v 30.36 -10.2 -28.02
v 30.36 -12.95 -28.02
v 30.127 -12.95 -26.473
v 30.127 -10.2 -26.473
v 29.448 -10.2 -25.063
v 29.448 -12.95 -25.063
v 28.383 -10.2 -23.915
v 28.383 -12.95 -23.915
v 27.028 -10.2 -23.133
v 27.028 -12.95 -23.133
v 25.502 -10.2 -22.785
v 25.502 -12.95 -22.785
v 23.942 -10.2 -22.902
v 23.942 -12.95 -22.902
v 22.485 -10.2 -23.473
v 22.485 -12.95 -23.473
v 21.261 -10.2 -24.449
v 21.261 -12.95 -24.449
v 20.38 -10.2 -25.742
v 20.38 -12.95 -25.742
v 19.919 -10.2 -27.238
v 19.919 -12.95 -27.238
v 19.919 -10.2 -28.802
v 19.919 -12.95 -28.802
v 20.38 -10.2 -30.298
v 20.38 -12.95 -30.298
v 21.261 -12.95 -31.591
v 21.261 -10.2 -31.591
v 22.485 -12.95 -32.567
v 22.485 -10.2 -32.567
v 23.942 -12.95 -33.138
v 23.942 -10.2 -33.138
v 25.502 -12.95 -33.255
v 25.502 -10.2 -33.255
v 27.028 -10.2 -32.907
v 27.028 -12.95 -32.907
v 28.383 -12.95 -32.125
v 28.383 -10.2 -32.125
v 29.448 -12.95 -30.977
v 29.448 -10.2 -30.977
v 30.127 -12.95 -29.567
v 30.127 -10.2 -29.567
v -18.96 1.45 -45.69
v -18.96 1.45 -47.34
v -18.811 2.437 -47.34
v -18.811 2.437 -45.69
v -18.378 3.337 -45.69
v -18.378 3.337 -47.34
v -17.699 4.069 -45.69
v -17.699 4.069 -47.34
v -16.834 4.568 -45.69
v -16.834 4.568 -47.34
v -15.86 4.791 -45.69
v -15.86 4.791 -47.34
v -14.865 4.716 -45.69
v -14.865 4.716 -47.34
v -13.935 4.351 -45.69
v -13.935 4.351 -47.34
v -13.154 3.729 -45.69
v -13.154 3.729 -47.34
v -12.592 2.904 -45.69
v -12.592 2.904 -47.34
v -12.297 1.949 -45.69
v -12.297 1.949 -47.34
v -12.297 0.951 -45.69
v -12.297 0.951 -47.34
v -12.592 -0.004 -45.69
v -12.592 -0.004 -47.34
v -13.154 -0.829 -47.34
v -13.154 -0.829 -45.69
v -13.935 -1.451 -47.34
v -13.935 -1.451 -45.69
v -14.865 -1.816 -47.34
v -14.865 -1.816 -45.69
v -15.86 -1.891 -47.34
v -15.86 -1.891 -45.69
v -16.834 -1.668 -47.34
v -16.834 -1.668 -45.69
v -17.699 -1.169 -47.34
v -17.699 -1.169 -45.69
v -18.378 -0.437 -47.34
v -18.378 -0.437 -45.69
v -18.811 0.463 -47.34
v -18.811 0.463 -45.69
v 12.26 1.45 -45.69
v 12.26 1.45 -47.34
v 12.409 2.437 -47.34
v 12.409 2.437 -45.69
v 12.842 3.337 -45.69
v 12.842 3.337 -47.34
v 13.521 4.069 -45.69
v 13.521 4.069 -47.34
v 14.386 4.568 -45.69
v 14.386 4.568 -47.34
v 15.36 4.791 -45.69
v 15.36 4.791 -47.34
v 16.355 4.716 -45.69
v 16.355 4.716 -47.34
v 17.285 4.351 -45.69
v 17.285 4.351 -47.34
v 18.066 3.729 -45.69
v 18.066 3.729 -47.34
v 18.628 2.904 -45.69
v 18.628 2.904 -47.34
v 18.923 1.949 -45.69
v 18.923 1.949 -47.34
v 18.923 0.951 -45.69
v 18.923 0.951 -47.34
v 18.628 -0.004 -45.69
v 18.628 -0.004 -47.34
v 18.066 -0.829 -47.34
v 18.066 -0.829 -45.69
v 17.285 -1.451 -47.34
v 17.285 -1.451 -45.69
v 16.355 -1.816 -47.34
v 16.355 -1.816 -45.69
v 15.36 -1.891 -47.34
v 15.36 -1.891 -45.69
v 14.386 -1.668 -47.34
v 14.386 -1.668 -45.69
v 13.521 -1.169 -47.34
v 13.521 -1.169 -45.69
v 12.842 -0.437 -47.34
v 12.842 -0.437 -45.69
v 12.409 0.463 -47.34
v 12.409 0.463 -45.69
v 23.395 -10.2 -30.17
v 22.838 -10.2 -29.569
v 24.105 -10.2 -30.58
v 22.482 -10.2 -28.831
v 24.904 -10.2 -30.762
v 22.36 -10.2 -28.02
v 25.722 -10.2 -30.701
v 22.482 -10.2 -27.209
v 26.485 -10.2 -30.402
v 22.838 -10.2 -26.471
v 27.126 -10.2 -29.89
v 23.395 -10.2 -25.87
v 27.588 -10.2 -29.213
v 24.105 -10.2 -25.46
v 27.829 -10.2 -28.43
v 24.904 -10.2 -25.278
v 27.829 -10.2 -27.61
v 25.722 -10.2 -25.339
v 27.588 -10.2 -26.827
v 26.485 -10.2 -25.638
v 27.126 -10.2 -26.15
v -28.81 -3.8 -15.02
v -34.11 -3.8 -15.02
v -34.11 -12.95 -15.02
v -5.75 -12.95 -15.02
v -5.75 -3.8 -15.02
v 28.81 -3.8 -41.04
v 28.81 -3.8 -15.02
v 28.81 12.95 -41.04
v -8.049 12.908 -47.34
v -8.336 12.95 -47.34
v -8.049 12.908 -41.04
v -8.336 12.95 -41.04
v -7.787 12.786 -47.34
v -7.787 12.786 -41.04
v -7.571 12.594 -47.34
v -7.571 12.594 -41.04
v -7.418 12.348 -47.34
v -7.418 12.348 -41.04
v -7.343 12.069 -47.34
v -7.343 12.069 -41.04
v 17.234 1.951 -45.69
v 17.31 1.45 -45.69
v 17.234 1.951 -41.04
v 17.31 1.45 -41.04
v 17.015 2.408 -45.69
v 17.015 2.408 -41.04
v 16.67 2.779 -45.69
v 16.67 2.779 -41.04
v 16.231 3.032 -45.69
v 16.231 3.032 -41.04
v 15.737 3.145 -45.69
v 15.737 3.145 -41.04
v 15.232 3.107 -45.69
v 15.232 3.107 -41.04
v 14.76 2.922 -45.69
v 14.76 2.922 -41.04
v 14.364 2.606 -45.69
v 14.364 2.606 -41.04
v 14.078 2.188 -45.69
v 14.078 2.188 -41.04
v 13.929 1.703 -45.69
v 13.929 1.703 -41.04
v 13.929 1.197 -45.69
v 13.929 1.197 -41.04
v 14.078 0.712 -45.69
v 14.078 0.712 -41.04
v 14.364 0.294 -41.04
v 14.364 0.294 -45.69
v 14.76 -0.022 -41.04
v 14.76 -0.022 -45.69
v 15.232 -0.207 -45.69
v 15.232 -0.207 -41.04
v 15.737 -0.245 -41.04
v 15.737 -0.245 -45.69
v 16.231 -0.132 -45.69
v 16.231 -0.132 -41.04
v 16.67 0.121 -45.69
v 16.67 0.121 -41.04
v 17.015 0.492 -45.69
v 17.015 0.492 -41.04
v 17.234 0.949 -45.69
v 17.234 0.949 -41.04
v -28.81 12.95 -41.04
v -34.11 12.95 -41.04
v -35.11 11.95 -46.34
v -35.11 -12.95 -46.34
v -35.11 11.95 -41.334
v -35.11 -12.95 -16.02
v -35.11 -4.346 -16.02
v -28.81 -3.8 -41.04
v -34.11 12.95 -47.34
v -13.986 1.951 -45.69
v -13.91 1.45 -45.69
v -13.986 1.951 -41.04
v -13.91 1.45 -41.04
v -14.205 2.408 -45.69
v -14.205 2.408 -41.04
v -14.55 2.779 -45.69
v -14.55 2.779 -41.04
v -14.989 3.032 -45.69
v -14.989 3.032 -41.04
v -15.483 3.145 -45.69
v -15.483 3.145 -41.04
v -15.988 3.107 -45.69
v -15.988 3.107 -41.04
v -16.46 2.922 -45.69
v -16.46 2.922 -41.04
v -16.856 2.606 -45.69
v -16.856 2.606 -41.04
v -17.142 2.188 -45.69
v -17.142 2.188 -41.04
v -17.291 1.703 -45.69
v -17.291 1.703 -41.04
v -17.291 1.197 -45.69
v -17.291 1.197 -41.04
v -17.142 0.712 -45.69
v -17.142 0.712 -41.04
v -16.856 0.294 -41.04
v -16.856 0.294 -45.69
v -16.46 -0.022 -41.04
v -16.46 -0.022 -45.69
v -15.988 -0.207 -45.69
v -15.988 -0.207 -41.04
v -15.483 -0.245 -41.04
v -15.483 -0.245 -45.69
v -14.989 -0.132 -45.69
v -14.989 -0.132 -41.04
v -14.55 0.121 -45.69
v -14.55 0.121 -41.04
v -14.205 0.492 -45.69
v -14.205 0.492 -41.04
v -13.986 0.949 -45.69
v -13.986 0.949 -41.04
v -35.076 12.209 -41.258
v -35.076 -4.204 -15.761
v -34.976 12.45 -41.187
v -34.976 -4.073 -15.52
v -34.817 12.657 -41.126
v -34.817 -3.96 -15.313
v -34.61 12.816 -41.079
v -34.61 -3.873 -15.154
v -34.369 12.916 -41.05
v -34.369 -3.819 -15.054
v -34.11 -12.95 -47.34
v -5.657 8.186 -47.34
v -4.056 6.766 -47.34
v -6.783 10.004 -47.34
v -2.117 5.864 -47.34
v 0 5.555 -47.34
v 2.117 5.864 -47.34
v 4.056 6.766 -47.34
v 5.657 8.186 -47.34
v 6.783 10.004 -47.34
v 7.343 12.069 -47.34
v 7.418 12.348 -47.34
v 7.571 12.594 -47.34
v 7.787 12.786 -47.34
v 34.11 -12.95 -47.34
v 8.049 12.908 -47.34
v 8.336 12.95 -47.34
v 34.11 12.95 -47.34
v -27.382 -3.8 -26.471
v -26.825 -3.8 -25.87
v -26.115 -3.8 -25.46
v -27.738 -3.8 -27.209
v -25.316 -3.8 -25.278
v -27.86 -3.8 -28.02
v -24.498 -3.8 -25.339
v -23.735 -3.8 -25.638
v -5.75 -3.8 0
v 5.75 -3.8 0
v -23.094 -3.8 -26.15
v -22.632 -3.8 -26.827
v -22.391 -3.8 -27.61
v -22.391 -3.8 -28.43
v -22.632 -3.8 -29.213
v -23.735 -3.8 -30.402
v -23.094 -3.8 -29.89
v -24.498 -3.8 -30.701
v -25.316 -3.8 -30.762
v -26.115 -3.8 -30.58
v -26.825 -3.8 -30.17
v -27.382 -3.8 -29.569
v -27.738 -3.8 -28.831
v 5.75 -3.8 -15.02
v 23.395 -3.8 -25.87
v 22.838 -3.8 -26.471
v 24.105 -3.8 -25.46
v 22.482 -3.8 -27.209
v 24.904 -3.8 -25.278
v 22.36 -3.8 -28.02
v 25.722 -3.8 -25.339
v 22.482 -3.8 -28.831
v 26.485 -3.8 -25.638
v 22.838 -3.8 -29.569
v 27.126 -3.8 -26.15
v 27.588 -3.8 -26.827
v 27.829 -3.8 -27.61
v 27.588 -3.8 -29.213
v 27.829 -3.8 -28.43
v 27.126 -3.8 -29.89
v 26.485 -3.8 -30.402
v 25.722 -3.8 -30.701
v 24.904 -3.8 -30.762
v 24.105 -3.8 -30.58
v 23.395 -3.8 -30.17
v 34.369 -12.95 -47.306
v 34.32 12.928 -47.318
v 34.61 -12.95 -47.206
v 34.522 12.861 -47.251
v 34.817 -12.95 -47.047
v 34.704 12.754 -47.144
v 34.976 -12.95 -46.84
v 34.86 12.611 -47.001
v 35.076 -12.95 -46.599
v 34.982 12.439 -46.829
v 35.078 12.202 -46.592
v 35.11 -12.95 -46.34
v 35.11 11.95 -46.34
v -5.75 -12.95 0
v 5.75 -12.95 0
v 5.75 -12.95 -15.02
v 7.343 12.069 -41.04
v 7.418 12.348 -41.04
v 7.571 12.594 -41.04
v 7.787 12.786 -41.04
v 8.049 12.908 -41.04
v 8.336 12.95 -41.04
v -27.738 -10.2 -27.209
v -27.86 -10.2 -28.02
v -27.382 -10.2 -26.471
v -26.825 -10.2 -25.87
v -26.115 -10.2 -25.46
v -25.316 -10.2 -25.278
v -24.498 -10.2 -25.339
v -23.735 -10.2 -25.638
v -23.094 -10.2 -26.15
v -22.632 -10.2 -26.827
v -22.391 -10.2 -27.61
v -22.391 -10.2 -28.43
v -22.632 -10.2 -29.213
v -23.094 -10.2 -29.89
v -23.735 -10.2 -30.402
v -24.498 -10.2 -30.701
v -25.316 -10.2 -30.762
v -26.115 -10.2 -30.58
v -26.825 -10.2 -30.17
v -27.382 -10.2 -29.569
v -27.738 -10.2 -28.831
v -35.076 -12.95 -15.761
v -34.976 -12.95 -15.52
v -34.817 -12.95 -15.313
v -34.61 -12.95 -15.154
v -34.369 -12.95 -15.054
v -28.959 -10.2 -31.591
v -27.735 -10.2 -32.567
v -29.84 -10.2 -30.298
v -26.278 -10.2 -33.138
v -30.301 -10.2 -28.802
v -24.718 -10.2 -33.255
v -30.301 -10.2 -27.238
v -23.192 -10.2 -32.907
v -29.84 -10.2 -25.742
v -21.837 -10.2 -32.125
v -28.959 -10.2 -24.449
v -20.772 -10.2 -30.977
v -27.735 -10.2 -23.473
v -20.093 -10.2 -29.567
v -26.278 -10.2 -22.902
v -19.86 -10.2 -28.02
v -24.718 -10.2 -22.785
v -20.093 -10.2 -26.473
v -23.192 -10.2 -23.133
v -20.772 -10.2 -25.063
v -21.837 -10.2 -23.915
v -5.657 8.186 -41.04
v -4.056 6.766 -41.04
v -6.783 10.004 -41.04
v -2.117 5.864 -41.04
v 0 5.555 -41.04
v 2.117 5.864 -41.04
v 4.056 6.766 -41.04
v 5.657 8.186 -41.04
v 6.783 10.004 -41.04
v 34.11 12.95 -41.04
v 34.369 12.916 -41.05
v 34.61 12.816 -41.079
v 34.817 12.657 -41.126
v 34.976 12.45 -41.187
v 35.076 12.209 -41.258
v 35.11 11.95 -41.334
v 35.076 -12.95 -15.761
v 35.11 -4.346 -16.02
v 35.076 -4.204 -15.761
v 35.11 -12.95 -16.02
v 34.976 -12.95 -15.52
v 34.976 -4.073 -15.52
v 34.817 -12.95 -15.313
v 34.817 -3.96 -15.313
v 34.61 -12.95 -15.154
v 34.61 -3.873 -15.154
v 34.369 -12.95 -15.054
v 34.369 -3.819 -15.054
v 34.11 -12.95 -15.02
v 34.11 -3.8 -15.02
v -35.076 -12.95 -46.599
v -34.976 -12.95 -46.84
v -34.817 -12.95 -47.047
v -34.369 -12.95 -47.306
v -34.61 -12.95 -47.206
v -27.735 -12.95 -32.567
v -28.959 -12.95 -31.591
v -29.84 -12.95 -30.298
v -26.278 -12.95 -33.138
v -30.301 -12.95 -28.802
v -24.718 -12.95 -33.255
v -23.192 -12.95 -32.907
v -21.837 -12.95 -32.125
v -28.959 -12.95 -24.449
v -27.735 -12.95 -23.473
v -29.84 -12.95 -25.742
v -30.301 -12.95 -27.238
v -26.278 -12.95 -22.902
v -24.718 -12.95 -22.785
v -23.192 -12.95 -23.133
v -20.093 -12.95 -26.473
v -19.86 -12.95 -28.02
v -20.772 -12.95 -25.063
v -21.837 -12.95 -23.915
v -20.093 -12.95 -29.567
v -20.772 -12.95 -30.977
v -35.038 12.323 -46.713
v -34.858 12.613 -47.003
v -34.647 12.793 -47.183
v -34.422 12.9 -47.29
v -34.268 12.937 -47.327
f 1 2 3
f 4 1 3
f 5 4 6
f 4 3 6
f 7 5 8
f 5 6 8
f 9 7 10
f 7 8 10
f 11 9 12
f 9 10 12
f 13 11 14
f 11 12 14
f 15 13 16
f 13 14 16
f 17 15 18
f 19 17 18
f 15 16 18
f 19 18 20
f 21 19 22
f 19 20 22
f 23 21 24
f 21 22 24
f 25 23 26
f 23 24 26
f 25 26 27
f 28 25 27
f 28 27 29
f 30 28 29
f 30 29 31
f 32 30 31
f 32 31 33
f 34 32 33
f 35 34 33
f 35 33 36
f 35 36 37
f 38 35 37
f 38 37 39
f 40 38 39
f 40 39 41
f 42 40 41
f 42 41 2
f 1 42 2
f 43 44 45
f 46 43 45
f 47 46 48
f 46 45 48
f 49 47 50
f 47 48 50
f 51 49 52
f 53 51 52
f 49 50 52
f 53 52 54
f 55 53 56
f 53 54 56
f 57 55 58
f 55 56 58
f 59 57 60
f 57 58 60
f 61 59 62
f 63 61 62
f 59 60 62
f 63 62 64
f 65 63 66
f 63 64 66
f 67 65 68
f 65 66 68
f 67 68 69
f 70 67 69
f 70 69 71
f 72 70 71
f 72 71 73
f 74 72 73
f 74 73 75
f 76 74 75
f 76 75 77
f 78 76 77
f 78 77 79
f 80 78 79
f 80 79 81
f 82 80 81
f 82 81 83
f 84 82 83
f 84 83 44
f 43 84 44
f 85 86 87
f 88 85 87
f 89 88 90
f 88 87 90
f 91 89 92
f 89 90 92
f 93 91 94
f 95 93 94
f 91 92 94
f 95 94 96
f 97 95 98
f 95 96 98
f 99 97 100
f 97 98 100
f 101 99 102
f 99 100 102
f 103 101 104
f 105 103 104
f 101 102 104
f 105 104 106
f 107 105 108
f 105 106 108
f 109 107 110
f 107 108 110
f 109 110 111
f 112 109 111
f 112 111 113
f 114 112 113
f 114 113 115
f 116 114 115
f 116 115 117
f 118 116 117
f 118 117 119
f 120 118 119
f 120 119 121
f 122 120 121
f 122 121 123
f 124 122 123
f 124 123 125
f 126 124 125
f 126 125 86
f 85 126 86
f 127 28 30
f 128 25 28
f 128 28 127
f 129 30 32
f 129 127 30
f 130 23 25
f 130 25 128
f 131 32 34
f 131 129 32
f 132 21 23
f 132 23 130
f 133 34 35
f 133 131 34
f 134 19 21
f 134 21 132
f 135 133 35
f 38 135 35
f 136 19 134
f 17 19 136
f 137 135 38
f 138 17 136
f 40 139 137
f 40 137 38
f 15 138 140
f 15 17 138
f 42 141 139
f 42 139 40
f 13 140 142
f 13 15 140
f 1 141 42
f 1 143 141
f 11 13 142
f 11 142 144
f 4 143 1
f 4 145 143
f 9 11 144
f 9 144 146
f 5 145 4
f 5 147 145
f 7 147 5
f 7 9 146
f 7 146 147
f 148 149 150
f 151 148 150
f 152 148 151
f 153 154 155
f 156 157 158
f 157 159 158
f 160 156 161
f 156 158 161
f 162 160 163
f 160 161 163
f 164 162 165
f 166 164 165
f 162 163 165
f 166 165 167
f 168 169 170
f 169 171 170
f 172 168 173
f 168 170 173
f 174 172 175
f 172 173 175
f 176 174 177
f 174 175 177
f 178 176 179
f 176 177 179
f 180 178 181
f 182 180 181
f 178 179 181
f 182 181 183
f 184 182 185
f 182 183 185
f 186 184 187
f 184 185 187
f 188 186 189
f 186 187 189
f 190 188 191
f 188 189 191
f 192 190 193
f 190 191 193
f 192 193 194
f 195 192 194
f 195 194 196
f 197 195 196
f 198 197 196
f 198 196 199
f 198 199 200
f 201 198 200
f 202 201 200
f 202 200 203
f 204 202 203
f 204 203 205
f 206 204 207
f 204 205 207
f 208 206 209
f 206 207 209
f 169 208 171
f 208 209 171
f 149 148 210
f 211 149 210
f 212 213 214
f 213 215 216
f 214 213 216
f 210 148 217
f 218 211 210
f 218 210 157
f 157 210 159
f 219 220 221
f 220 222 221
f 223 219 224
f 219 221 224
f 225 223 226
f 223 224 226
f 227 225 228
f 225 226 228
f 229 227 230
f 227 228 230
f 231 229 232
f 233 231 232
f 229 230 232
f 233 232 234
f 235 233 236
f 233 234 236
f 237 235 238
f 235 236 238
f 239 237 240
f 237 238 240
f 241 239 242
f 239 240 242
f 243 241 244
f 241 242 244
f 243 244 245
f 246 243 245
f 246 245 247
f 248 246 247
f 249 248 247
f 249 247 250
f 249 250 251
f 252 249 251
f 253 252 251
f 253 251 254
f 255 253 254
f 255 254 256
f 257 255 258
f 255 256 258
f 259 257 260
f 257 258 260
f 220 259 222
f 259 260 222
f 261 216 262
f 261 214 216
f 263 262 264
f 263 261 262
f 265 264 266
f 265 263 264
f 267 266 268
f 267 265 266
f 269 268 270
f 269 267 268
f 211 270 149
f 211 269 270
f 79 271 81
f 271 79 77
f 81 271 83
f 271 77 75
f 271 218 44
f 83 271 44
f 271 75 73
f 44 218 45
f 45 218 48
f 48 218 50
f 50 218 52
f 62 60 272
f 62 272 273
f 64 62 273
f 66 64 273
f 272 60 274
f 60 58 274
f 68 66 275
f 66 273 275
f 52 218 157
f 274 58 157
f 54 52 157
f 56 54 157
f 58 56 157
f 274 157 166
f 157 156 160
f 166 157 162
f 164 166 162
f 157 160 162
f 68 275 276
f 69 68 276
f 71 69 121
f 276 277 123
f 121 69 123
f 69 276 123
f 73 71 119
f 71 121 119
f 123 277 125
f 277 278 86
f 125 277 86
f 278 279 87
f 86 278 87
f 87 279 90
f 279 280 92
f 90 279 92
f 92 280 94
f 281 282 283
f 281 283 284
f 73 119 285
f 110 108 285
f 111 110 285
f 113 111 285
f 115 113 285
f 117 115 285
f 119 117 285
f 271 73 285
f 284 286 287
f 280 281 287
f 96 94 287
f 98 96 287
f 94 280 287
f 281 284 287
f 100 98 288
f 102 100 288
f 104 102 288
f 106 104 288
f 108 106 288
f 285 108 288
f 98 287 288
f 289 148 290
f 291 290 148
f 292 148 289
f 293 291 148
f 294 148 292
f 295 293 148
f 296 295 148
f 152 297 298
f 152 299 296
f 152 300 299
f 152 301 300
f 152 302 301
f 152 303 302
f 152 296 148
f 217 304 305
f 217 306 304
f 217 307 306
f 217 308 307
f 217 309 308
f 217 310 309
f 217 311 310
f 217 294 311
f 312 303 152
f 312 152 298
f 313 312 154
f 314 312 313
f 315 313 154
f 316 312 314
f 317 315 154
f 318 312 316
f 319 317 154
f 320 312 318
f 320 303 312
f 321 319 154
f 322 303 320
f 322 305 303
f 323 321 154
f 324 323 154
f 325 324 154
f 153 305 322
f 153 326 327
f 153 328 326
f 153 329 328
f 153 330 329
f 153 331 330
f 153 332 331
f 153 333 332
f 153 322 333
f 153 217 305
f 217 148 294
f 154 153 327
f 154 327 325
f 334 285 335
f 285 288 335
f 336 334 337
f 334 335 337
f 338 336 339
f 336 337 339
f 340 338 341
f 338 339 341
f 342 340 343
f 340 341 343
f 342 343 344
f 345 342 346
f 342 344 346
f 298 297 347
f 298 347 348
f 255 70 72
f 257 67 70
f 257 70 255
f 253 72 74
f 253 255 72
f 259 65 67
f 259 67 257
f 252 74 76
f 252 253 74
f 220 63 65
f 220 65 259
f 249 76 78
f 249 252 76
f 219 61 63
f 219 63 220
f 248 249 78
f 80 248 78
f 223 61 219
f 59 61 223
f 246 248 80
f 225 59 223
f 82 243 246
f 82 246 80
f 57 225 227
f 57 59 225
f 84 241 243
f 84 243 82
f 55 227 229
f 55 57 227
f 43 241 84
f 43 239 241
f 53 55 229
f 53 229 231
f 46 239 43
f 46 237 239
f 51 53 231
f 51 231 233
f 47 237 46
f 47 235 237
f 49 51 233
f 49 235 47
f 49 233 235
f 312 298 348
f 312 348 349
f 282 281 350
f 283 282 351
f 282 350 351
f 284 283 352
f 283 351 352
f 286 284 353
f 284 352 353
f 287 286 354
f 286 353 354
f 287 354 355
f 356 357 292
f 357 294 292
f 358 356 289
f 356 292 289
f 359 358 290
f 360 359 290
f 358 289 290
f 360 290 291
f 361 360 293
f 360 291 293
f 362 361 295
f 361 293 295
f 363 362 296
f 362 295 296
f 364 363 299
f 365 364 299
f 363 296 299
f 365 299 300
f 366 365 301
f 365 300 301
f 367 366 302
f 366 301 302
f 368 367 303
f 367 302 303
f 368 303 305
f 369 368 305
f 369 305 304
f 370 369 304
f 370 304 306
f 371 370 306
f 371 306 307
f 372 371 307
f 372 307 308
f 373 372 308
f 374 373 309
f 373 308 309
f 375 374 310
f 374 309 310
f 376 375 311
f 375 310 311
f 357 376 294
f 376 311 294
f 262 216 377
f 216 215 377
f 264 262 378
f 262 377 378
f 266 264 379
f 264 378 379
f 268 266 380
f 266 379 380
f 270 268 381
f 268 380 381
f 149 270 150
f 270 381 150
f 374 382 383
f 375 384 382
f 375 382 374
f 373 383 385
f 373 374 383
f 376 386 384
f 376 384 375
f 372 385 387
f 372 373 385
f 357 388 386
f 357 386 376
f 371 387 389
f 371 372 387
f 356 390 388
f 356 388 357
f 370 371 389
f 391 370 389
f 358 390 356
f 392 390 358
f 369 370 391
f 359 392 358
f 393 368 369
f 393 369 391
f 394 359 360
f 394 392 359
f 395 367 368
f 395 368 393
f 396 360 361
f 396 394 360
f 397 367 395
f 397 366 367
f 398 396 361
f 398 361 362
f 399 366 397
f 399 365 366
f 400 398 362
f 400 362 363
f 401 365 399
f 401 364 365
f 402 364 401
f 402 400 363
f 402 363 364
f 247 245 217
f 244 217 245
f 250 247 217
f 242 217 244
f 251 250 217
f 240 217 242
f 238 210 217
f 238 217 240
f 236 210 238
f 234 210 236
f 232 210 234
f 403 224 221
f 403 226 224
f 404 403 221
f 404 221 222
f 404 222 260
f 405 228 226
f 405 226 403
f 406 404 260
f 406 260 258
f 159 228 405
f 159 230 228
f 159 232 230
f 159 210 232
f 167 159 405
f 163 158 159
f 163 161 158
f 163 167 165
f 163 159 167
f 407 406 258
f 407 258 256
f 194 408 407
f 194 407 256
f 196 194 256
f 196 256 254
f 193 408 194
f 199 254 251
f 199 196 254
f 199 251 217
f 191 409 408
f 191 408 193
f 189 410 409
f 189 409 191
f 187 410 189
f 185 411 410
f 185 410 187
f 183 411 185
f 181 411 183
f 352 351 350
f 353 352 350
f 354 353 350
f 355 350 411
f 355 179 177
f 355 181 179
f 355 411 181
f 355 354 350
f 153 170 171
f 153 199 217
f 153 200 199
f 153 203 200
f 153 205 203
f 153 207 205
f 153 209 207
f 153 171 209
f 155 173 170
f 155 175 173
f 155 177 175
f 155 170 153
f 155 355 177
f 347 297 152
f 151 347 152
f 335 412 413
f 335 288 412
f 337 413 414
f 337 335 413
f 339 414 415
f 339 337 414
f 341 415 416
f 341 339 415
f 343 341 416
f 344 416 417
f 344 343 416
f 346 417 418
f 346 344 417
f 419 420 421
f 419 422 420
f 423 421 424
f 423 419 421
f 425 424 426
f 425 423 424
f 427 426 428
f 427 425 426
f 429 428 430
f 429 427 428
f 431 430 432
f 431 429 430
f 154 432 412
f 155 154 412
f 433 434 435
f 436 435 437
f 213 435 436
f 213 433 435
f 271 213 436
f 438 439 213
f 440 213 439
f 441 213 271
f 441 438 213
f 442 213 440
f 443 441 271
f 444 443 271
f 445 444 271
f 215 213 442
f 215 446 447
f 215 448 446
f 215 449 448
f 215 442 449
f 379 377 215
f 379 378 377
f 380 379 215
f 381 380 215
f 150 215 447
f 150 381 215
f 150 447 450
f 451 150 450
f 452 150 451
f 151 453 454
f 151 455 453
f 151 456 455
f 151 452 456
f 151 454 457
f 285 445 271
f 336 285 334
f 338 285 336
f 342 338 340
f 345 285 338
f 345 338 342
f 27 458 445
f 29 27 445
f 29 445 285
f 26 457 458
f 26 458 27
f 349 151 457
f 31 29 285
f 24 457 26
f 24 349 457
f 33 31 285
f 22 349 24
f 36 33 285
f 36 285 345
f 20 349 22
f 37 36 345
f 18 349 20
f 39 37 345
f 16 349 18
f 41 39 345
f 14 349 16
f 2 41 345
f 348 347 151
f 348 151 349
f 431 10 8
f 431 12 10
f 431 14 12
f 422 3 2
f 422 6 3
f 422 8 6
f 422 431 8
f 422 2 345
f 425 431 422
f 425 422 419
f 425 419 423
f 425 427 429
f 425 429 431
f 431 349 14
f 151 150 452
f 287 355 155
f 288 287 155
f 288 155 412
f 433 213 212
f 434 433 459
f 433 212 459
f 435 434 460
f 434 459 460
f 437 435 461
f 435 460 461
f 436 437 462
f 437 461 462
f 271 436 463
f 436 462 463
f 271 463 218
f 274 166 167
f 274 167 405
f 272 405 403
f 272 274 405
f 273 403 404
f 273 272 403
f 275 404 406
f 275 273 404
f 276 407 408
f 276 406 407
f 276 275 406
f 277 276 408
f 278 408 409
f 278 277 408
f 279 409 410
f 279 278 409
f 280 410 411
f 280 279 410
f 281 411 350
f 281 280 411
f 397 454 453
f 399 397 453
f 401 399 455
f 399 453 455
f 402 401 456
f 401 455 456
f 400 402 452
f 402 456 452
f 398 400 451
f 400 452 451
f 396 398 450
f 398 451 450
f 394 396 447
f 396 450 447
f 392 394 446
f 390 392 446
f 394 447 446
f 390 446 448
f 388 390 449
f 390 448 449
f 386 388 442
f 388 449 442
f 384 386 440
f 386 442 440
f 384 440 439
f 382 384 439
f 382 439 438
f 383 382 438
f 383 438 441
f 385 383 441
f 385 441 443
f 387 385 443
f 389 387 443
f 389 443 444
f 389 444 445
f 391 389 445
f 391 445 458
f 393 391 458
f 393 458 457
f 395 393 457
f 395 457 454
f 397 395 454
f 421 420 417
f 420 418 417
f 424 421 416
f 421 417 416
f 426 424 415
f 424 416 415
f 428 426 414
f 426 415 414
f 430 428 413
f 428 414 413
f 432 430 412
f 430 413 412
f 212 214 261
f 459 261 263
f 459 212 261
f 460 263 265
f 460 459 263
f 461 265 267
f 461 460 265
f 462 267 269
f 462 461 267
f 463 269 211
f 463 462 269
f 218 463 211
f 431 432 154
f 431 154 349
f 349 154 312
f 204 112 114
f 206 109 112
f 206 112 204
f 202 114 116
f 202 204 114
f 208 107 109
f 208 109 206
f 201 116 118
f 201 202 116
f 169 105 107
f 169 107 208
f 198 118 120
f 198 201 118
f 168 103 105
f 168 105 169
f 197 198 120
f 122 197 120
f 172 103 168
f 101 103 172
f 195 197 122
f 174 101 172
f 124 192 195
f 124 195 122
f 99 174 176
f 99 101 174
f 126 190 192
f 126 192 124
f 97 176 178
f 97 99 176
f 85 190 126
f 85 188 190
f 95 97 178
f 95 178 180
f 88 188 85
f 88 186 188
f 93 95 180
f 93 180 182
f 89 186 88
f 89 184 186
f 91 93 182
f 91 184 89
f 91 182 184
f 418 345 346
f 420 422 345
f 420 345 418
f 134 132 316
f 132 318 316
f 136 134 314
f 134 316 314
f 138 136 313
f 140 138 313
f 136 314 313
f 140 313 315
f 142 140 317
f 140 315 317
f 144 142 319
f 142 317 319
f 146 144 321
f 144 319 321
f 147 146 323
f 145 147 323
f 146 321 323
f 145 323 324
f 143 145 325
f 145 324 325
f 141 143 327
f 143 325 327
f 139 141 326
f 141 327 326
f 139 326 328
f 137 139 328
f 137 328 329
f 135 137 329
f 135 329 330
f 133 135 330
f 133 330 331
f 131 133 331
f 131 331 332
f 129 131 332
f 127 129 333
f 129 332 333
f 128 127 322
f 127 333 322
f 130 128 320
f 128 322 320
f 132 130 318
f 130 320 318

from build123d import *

# Parameters (mm, degrees)
SKETCH1_W                       = 70.22
SKETCH1_H                       = 25.9
BOSS_EXTRUDE1_DEPTH             = 47.34
SKETCH6_W                       = 29.36
SKETCH6_H                       = 15.02
CUT_EXTRUDE1_DEPTH              = 65.378549999
SKETCH8_W                       = 57.62
SKETCH8_H                       = 41.04
CUT_EXTRUDE2_DEPTH              = 16.75
CUT_EXTRUDE3_DEPTH              = 86.671620155
CUT_EXTRUDE4_DEPTH              = 56.540041412
CUT_EXTRUDE4_DEPTH_BACK         = 56.540041412
FILLET9_R                       = 1
CBORE_FOR_M3_SBHCS1_D           = 3.4
CBORE_FOR_M3_SBHCS1_CBORE_D     = 6.7
CBORE_FOR_M3_SBHCS1_CBORE_DEPTH = 1.65
CBORE_FOR_M5_SBHCS1_D           = 5.5
CBORE_FOR_M5_SBHCS1_CBORE_D     = 10.5
CBORE_FOR_M5_SBHCS1_CBORE_DEPTH = 2.75


with BuildPart() as part:
    # Sketch1 → Boss-Extrude1 (new body)
    with BuildSketch(Plane.XY):
        Rectangle(SKETCH1_W, SKETCH1_H)
    extrude(amount=-BOSS_EXTRUDE1_DEPTH)

    # Sketch6 → Cut-Extrude1 (cut, through all)
    with BuildSketch(Plane(origin=(0, 12.95, 0), x_dir=(1, 0, 0), z_dir=(0, 1, 0))):
        with Locations((-20.43, 7.51)):
            Rectangle(SKETCH6_W, SKETCH6_H)
    cut_extrude1 = extrude(amount=-CUT_EXTRUDE1_DEPTH, mode=Mode.SUBTRACT)

    # Mirror1: Cut-Extrude1 across plane
    add(cut_extrude1.mirror(Plane(origin=(0, 0, 0), x_dir=(0, 0, 1), z_dir=(1, 0, 0))), mode=Mode.SUBTRACT)

    # Sketch8 → Cut-Extrude2 (cut)
    with BuildSketch(Plane(origin=(0, 12.95, 0), x_dir=(1, 0, 0), z_dir=(0, 1, 0))):
        with Locations((0, 20.52)):
            Rectangle(SKETCH8_W, SKETCH8_H)
    extrude(amount=-CUT_EXTRUDE2_DEPTH, mode=Mode.SUBTRACT)

    # Sketch12 → Cut-Extrude3 (cut, through all)
    with BuildSketch(Plane(origin=(35.11, 0, 0), x_dir=(0, 0, -1), z_dir=(1, 0, 0))):
        Polygon((15.02, -3.8), (41.04, 12.95), (15.02, 12.95), align=None)
    extrude(amount=-CUT_EXTRUDE3_DEPTH, mode=Mode.SUBTRACT)

    # Sketch16 → Cut-Extrude4 (cut, two sides: drawn at the far end of the back side and taken through both)
    with BuildSketch(Plane.XY.offset(-41.04).offset(-CUT_EXTRUDE4_DEPTH_BACK)):
        with BuildLine():
            Line((-7.395445113, 122.499442273), (-7.395445113, 12.95))
            ThreePointArc((-7.395445113, 12.95), (0, 5.554554887), (7.395445113, 12.95))
            Line((7.395445113, 12.95), (7.395445113, 122.499442273))
            Line((7.395445113, 122.499442273), (7.395445113, 341.598326819))
            Line((7.395445113, 341.598326819), (-7.395445113, 341.598326819))
            Line((-7.395445113, 341.598326819), (-7.395445113, 122.499442273))
        make_face()
    extrude(amount=CUT_EXTRUDE4_DEPTH + CUT_EXTRUDE4_DEPTH_BACK, mode=Mode.SUBTRACT)

    # Fillet9
    fillet9_edges = [part.edges().sort_by_distance(p)[0] for p in [
        (-35.11, 0, -47.34),
        (7.395445113, 12.95, -44.19),
        (-7.395445113, 12.95, -44.19),
        (-35.11, -8.375, -15.02),
        (35.11, -8.375, -15.02),
        (35.11, 0, -47.34),
        (-35.11, 12.95, -44.19),
        (35.11, 12.95, -44.19),
        (-35.11, 4.575, -28.03),
        (35.11, 4.575, -28.03),
    ]]
    fillet(fillet9_edges, radius=FILLET9_R)

    # CBORE for M3 SBHCS1 (through all)
    with Locations(Plane(origin=(0, 0, -47.34), x_dir=(-1, 0, 0), z_dir=(0, 0, -1))):
        with Locations((-15.61, 1.45), (15.61, 1.45)):
            CounterBoreHole(CBORE_FOR_M3_SBHCS1_D / 2, CBORE_FOR_M3_SBHCS1_CBORE_D / 2, CBORE_FOR_M3_SBHCS1_CBORE_DEPTH)

    # CBORE for M5 SBHCS1 (through all)
    with Locations(Plane.XZ.offset(12.95)):
        with Locations((-25.11, -28.02), (25.11, -28.02)):
            CounterBoreHole(CBORE_FOR_M5_SBHCS1_D / 2, CBORE_FOR_M5_SBHCS1_CBORE_D / 2, CBORE_FOR_M5_SBHCS1_CBORE_DEPTH)


solid = part.part
